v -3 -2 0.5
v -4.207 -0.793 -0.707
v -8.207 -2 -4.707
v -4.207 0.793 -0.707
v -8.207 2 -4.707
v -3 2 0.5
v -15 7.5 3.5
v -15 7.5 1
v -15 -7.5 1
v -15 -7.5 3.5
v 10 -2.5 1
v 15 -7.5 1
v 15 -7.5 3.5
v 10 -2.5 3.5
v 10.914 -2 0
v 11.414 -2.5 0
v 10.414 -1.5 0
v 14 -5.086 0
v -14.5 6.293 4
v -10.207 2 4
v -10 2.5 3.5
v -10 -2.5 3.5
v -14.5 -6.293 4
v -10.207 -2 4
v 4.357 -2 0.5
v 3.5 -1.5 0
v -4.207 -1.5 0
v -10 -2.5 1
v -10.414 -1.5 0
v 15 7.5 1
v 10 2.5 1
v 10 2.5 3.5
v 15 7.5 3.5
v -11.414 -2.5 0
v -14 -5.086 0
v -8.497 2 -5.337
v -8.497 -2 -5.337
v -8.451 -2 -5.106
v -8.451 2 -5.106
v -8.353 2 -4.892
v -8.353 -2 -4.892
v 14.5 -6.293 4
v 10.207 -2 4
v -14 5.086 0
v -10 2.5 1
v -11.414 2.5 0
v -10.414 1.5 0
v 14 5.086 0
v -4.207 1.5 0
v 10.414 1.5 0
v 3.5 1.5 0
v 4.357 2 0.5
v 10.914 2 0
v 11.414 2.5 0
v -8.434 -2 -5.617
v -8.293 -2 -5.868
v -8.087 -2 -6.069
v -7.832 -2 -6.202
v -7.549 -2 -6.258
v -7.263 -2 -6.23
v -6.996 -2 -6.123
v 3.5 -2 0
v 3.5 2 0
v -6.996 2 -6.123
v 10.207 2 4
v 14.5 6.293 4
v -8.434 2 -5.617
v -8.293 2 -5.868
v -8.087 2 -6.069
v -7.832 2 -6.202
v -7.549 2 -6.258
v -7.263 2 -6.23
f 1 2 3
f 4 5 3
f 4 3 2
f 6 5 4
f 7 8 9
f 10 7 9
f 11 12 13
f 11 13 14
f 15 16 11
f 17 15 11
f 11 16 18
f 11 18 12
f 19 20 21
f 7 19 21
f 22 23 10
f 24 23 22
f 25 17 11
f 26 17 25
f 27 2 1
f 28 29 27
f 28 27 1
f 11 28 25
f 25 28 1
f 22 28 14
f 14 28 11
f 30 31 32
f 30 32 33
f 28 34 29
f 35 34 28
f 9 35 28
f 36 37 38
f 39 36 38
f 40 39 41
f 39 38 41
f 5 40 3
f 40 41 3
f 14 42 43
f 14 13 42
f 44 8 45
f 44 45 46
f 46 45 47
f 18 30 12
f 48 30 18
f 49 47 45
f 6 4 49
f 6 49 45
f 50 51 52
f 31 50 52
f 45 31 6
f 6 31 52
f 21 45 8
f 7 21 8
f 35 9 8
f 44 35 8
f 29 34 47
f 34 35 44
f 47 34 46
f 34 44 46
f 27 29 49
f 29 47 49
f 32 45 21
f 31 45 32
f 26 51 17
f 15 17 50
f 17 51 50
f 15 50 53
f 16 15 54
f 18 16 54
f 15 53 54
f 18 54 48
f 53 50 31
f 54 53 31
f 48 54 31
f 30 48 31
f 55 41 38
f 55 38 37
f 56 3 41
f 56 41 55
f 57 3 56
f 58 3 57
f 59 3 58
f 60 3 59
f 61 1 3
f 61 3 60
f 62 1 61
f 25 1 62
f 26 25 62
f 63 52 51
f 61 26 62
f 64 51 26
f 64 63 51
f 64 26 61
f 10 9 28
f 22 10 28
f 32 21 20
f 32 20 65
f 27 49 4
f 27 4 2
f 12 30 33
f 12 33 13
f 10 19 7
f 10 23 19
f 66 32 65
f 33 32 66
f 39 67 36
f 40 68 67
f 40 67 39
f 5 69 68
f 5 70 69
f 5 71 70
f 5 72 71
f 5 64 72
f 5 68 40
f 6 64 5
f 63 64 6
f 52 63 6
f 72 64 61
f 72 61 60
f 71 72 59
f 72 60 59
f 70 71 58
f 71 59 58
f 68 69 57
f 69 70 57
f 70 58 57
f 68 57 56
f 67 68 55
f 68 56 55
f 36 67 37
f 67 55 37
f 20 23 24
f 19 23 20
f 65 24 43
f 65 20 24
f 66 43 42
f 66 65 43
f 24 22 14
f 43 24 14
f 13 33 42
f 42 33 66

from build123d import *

# Parameters (mm, degrees)
SKETCH1_W           = 20
SKETCH1_H           = 5
BOSS_EXTRUDE1_DEPTH = 4
BOSS_EXTRUDE2_DEPTH = 2
CHAMFER1_SIZE       = 0.5
CHAMFER2_SIZE       = 1
CHAMFER3_SIZE       = 1
CHAMFER3_SIZE2      = 0.707106781
FILLET5_R           = 1


with BuildPart() as part:
    # Sketch1 → Boss-Extrude1 (new body)
    with BuildSketch(Plane.XY):
        Polygon((-15, 7.5), (-15, -7.5), (-10, -2.5), (-10, 2.5), align=None)
        Rectangle(SKETCH1_W, SKETCH1_H)
        Polygon((10, 2.5), (15, 7.5), (15, -7.5), (10, -2.5), align=None)
    extrude(amount=BOSS_EXTRUDE1_DEPTH)

    # Sketch4 → Boss-Extrude2 (add, symmetric)
    with BuildSketch(Plane(origin=(0, 0, 0), x_dir=(1, 0, 0), z_dir=(0, 1, 0))):
        Polygon((3.5, 0), (-8.5, 7), (-8.5, 5), (-3.5, 0), align=None)
    extrude(amount=BOSS_EXTRUDE2_DEPTH, both=True)

    # Chamfer1
    chamfer1_edges = [part.edges().sort_by_distance(p)[0] for p in [
        (-12.5, -5, 4),
        (0, -2.5, 4),
        (12.5, -5, 4),
        (15, 0, 4),
        (12.5, 5, 4),
        (0, 2.5, 4),
        (-12.5, 5, 4),
        (-15, 0, 4),
    ]]
    chamfer(chamfer1_edges, length=CHAMFER1_SIZE)

    # Chamfer2
    # the kernel refuses this chamfer: 1 mm, written as the material it takes off along each edge
    with BuildSketch(Plane(origin=(16.81845448, -9.31845448, 0), x_dir=(0.7071067811865414, 0.7071067811865538, 0), z_dir=(-0.7071067811865538, 0.7071067811865415, 0))) as chamfer2_piece_1_section:
        Polygon((CHAMFER2_SIZE, 0), (0, -CHAMFER2_SIZE), (0, 0), align=None)
    chamfer2_piece_1 = extrude(amount=12.214433788, mode=Mode.PRIVATE)
    chamfer2_piece_1 = split(chamfer2_piece_1, bisect_by=Plane(origin=(16.81845448, -5.40922724, 3.90922724), z_dir=(0, -0.7071067811865476, -0.7071067811865476)), keep=Keep.TOP, mode=Mode.PRIVATE)
    add(chamfer2_piece_1, mode=Mode.SUBTRACT)
    with BuildSketch(Plane(origin=(15, 10.071682988, 0), x_dir=(-1, 0, 0), z_dir=(0, -1, 0)), Plane(origin=(-15, 10.071682988, 0), x_dir=(0, 0, 1), z_dir=(0, -1, 0))) as chamfer2_piece_2:
        Polygon((CHAMFER2_SIZE, 0), (0, -CHAMFER2_SIZE), (0, 0), align=None)
    extrude(amount=20.143365976, mode=Mode.SUBTRACT)
    with BuildSketch(Plane(origin=(8.18154552, 0.68154552, 0), x_dir=(0.707106781186537, -0.7071067811865581, 0), z_dir=(0.7071067811865581, 0.707106781186537, 0))) as chamfer2_piece_3_section:
        Polygon((CHAMFER2_SIZE, 0), (0, -CHAMFER2_SIZE), (0, 0), align=None)
    chamfer2_piece_3 = extrude(amount=12.214433788, mode=Mode.PRIVATE)
    chamfer2_piece_3 = split(chamfer2_piece_3, bisect_by=Plane(origin=(8.18154552, 1.09077276, -0.40922724), z_dir=(0, 0.7071067811865476, -0.7071067811865476)), keep=Keep.TOP, mode=Mode.PRIVATE)
    add(chamfer2_piece_3, mode=Mode.SUBTRACT)
    with BuildSketch(Plane(origin=(12.571682988, 2.5, 0), x_dir=(0, -1, 0), z_dir=(-1, 0, 0))) as chamfer2_piece_4_section:
        Polygon((CHAMFER2_SIZE, 0), (0, CHAMFER2_SIZE), (0, 0), align=None)
    chamfer2_piece_4 = extrude(amount=25.143365976, mode=Mode.PRIVATE)
    chamfer2_piece_4 = split(chamfer2_piece_4, bisect_by=Plane(origin=(10.268509587, 2.5, 3.948297259), z_dir=(0.5038710255240867, 0, -0.8637789008984332)), keep=Keep.TOP, mode=Mode.PRIVATE)
    chamfer2_piece_4 = split(chamfer2_piece_4, bisect_by=Plane(origin=(12.282315632, 2.789367356, -0.40922724), z_dir=(-0.4999999999999927, 0.5000000000000075, -0.7071067811865475)), keep=Keep.TOP, mode=Mode.PRIVATE)
    add(chamfer2_piece_4, mode=Mode.SUBTRACT)
    with BuildSketch(Plane(origin=(12.571682988, 2.5, 0), x_dir=(0, -1, 0), z_dir=(-1, 0, 0))) as chamfer2_piece_5_section:
        Polygon((CHAMFER2_SIZE, 0), (0, CHAMFER2_SIZE), (0, 0), align=None)
    chamfer2_piece_5 = extrude(amount=25.143365976, mode=Mode.PRIVATE)
    chamfer2_piece_5 = split(chamfer2_piece_5, bisect_by=Plane(origin=(12.571682988, 2, 0), z_dir=(0, 1, 0)), keep=Keep.TOP, mode=Mode.PRIVATE)
    chamfer2_piece_5 = split(chamfer2_piece_5, bisect_by=Plane(origin=(12.282315632, 2.789367356, -0.40922724), z_dir=(-0.4999999999999927, 0.5000000000000075, -0.7071067811865475)), keep=Keep.TOP, mode=Mode.PRIVATE)
    chamfer2_piece_5 = split(chamfer2_piece_5, bisect_by=Plane(origin=(6.57520885, -3.496474138, 8.480295052), z_dir=(0.49999999999999395, 0.500000000000006, -0.7071067811865475)), keep=Keep.TOP, mode=Mode.PRIVATE)
    add(chamfer2_piece_5, mode=Mode.SUBTRACT)
    with BuildSketch(Plane(origin=(12.571682988, 2.5, 0), x_dir=(0, -1, 0), z_dir=(-1, 0, 0))) as chamfer2_piece_6_section:
        Polygon((CHAMFER2_SIZE, 0), (0, CHAMFER2_SIZE), (0, 0), align=None)
    chamfer2_piece_6 = extrude(amount=25.143365976, mode=Mode.PRIVATE)
    chamfer2_piece_6 = split(chamfer2_piece_6, bisect_by=Plane(origin=(4.535841494, 2.5, 8.035841494), z_dir=(-0.7071067811865487, 0, 0.7071067811865464)), keep=Keep.TOP, mode=Mode.PRIVATE)
    chamfer2_piece_6 = split(chamfer2_piece_6, bisect_by=Plane(origin=(6.57520885, -3.496474138, 8.480295052), z_dir=(0.49999999999999395, 0.500000000000006, -0.7071067811865475)), keep=Keep.TOP, mode=Mode.PRIVATE)
    add(chamfer2_piece_6, mode=Mode.SUBTRACT)
    with BuildSketch(Plane(origin=(-12.571682988, -2.5, 0), x_dir=(0, 1, 0), z_dir=(1, 0, 0))) as chamfer2_piece_7_section:
        Polygon((CHAMFER2_SIZE, 0), (0, CHAMFER2_SIZE), (0, 0), align=None)
    chamfer2_piece_7 = extrude(amount=25.143365976, mode=Mode.PRIVATE)
    chamfer2_piece_7 = split(chamfer2_piece_7, bisect_by=Plane(origin=(-8.035841494, -2.5, -4.535841494), z_dir=(-0.7071067811865487, 0, 0.7071067811865464)), keep=Keep.TOP, mode=Mode.PRIVATE)
    chamfer2_piece_7 = split(chamfer2_piece_7, bisect_by=Plane(origin=(-12.282315632, -2.789367356, -0.40922724), z_dir=(0.499999999999994, -0.5000000000000063, -0.7071067811865475)), keep=Keep.TOP, mode=Mode.PRIVATE)
    add(chamfer2_piece_7, mode=Mode.SUBTRACT)
    with BuildSketch(Plane(origin=(-12.571682988, -2.5, 0), x_dir=(0, 1, 0), z_dir=(1, 0, 0))) as chamfer2_piece_8_section:
        Polygon((CHAMFER2_SIZE, 0), (0, CHAMFER2_SIZE), (0, 0), align=None)
    chamfer2_piece_8 = extrude(amount=25.143365976, mode=Mode.PRIVATE)
    chamfer2_piece_8 = split(chamfer2_piece_8, bisect_by=Plane(origin=(-12.571682988, -2, 0), z_dir=(0, -1, 0)), keep=Keep.TOP, mode=Mode.PRIVATE)
    chamfer2_piece_8 = split(chamfer2_piece_8, bisect_by=Plane(origin=(-12.282315632, -2.789367356, -0.40922724), z_dir=(0.499999999999994, -0.5000000000000063, -0.7071067811865475)), keep=Keep.TOP, mode=Mode.PRIVATE)
    chamfer2_piece_8 = split(chamfer2_piece_8, bisect_by=Plane(origin=(-6.57520885, 3.496474138, 8.480295052), z_dir=(-0.49999999999999584, -0.5000000000000047, -0.7071067811865475)), keep=Keep.TOP, mode=Mode.PRIVATE)
    add(chamfer2_piece_8, mode=Mode.SUBTRACT)
    with BuildSketch(Plane(origin=(-12.571682988, -2.5, 0), x_dir=(0, 1, 0), z_dir=(1, 0, 0))) as chamfer2_piece_9_section:
        Polygon((CHAMFER2_SIZE, 0), (0, CHAMFER2_SIZE), (0, 0), align=None)
    chamfer2_piece_9 = extrude(amount=25.143365976, mode=Mode.PRIVATE)
    chamfer2_piece_9 = split(chamfer2_piece_9, bisect_by=Plane(origin=(-8.491307514, -2.5, -6.994929383), z_dir=(0.5038710255240867, 0, -0.8637789008984332)), keep=Keep.TOP, mode=Mode.PRIVATE)
    chamfer2_piece_9 = split(chamfer2_piece_9, bisect_by=Plane(origin=(-6.57520885, 3.496474138, 8.480295052), z_dir=(-0.49999999999999584, -0.5000000000000047, -0.7071067811865475)), keep=Keep.TOP, mode=Mode.PRIVATE)
    add(chamfer2_piece_9, mode=Mode.SUBTRACT)
    with BuildSketch(Plane(origin=(-16.81845448, -9.31845448, 0), x_dir=(-0.7071067811865389, 0.7071067811865562, 0), z_dir=(0.7071067811865562, 0.7071067811865389, 0))) as chamfer2_piece_10_section:
        Polygon((CHAMFER2_SIZE, 0), (0, CHAMFER2_SIZE), (0, 0), align=None)
    chamfer2_piece_10 = extrude(amount=12.214433788, mode=Mode.PRIVATE)
    chamfer2_piece_10 = split(chamfer2_piece_10, bisect_by=Plane(origin=(-16.81845448, -5.40922724, 3.90922724), z_dir=(0, -0.7071067811865476, -0.7071067811865476)), keep=Keep.TOP, mode=Mode.PRIVATE)
    add(chamfer2_piece_10, mode=Mode.SUBTRACT)
    with BuildSketch(Plane(origin=(-8.18154552, 0.68154552, 0), x_dir=(0, 0, 1), z_dir=(-0.707106781186556, 0.707106781186539, 0))) as chamfer2_piece_11_section:
        Polygon((CHAMFER2_SIZE, 0), (0, -CHAMFER2_SIZE), (0, 0), align=None)
    chamfer2_piece_11 = extrude(amount=12.214433788, mode=Mode.PRIVATE)
    chamfer2_piece_11 = split(chamfer2_piece_11, bisect_by=Plane(origin=(-8.18154552, 1.09077276, -0.40922724), z_dir=(0, 0.7071067811865476, -0.7071067811865476)), keep=Keep.TOP, mode=Mode.PRIVATE)
    add(chamfer2_piece_11, mode=Mode.SUBTRACT)

    # Chamfer3
    chamfer3_edges = [part.edges().sort_by_distance(p)[0] for p in [
        (-3.5, 0, 0),
    ]]
    chamfer3_side = [part.faces().sort_by_distance(p)[0] for p in [
        (-5.967078189, 0, -2.467078189),
    ]]
    chamfer(chamfer3_edges, length=CHAMFER3_SIZE, length2=CHAMFER3_SIZE2, reference=chamfer3_side[0])

    # Fillet5
    # the kernel refuses this fillet: 1 mm, written as the material it takes off along each edge
    with BuildSketch(Plane(origin=(-8.5, -6.352592498, -7), x_dir=(0, 0, 1), z_dir=(0, 1, 0))) as fillet5_piece_1:
        with BuildLine():
            CenterArc((FILLET5_R * 1.74103699912, FILLET5_R), FILLET5_R, 149.743562836, 120.256437164)
            Line((FILLET5_R * 0.877258098223, FILLET5_R * 1.50387102552), (0, 0))
            Line((0, 0), (FILLET5_R * 1.74103699912, 0))
        make_face()
    extrude(amount=12.705184996, mode=Mode.SUBTRACT)
    with BuildSketch(Plane(origin=(-8.5, -3.035533906, -5), x_dir=(0, 0, -1), z_dir=(0, 1, 0))) as fillet5_piece_2:
        with BuildLine():
            CenterArc((FILLET5_R * 0.414213562373, -FILLET5_R), FILLET5_R, 90, 45)
            Line((-FILLET5_R * 0.292893218813, -FILLET5_R * 0.292893218813), (0, 0))
            Line((0, 0), (FILLET5_R * 0.414213562373, 0))
        make_face()
    extrude(amount=6.071067812, mode=Mode.SUBTRACT)


solid = part.part
